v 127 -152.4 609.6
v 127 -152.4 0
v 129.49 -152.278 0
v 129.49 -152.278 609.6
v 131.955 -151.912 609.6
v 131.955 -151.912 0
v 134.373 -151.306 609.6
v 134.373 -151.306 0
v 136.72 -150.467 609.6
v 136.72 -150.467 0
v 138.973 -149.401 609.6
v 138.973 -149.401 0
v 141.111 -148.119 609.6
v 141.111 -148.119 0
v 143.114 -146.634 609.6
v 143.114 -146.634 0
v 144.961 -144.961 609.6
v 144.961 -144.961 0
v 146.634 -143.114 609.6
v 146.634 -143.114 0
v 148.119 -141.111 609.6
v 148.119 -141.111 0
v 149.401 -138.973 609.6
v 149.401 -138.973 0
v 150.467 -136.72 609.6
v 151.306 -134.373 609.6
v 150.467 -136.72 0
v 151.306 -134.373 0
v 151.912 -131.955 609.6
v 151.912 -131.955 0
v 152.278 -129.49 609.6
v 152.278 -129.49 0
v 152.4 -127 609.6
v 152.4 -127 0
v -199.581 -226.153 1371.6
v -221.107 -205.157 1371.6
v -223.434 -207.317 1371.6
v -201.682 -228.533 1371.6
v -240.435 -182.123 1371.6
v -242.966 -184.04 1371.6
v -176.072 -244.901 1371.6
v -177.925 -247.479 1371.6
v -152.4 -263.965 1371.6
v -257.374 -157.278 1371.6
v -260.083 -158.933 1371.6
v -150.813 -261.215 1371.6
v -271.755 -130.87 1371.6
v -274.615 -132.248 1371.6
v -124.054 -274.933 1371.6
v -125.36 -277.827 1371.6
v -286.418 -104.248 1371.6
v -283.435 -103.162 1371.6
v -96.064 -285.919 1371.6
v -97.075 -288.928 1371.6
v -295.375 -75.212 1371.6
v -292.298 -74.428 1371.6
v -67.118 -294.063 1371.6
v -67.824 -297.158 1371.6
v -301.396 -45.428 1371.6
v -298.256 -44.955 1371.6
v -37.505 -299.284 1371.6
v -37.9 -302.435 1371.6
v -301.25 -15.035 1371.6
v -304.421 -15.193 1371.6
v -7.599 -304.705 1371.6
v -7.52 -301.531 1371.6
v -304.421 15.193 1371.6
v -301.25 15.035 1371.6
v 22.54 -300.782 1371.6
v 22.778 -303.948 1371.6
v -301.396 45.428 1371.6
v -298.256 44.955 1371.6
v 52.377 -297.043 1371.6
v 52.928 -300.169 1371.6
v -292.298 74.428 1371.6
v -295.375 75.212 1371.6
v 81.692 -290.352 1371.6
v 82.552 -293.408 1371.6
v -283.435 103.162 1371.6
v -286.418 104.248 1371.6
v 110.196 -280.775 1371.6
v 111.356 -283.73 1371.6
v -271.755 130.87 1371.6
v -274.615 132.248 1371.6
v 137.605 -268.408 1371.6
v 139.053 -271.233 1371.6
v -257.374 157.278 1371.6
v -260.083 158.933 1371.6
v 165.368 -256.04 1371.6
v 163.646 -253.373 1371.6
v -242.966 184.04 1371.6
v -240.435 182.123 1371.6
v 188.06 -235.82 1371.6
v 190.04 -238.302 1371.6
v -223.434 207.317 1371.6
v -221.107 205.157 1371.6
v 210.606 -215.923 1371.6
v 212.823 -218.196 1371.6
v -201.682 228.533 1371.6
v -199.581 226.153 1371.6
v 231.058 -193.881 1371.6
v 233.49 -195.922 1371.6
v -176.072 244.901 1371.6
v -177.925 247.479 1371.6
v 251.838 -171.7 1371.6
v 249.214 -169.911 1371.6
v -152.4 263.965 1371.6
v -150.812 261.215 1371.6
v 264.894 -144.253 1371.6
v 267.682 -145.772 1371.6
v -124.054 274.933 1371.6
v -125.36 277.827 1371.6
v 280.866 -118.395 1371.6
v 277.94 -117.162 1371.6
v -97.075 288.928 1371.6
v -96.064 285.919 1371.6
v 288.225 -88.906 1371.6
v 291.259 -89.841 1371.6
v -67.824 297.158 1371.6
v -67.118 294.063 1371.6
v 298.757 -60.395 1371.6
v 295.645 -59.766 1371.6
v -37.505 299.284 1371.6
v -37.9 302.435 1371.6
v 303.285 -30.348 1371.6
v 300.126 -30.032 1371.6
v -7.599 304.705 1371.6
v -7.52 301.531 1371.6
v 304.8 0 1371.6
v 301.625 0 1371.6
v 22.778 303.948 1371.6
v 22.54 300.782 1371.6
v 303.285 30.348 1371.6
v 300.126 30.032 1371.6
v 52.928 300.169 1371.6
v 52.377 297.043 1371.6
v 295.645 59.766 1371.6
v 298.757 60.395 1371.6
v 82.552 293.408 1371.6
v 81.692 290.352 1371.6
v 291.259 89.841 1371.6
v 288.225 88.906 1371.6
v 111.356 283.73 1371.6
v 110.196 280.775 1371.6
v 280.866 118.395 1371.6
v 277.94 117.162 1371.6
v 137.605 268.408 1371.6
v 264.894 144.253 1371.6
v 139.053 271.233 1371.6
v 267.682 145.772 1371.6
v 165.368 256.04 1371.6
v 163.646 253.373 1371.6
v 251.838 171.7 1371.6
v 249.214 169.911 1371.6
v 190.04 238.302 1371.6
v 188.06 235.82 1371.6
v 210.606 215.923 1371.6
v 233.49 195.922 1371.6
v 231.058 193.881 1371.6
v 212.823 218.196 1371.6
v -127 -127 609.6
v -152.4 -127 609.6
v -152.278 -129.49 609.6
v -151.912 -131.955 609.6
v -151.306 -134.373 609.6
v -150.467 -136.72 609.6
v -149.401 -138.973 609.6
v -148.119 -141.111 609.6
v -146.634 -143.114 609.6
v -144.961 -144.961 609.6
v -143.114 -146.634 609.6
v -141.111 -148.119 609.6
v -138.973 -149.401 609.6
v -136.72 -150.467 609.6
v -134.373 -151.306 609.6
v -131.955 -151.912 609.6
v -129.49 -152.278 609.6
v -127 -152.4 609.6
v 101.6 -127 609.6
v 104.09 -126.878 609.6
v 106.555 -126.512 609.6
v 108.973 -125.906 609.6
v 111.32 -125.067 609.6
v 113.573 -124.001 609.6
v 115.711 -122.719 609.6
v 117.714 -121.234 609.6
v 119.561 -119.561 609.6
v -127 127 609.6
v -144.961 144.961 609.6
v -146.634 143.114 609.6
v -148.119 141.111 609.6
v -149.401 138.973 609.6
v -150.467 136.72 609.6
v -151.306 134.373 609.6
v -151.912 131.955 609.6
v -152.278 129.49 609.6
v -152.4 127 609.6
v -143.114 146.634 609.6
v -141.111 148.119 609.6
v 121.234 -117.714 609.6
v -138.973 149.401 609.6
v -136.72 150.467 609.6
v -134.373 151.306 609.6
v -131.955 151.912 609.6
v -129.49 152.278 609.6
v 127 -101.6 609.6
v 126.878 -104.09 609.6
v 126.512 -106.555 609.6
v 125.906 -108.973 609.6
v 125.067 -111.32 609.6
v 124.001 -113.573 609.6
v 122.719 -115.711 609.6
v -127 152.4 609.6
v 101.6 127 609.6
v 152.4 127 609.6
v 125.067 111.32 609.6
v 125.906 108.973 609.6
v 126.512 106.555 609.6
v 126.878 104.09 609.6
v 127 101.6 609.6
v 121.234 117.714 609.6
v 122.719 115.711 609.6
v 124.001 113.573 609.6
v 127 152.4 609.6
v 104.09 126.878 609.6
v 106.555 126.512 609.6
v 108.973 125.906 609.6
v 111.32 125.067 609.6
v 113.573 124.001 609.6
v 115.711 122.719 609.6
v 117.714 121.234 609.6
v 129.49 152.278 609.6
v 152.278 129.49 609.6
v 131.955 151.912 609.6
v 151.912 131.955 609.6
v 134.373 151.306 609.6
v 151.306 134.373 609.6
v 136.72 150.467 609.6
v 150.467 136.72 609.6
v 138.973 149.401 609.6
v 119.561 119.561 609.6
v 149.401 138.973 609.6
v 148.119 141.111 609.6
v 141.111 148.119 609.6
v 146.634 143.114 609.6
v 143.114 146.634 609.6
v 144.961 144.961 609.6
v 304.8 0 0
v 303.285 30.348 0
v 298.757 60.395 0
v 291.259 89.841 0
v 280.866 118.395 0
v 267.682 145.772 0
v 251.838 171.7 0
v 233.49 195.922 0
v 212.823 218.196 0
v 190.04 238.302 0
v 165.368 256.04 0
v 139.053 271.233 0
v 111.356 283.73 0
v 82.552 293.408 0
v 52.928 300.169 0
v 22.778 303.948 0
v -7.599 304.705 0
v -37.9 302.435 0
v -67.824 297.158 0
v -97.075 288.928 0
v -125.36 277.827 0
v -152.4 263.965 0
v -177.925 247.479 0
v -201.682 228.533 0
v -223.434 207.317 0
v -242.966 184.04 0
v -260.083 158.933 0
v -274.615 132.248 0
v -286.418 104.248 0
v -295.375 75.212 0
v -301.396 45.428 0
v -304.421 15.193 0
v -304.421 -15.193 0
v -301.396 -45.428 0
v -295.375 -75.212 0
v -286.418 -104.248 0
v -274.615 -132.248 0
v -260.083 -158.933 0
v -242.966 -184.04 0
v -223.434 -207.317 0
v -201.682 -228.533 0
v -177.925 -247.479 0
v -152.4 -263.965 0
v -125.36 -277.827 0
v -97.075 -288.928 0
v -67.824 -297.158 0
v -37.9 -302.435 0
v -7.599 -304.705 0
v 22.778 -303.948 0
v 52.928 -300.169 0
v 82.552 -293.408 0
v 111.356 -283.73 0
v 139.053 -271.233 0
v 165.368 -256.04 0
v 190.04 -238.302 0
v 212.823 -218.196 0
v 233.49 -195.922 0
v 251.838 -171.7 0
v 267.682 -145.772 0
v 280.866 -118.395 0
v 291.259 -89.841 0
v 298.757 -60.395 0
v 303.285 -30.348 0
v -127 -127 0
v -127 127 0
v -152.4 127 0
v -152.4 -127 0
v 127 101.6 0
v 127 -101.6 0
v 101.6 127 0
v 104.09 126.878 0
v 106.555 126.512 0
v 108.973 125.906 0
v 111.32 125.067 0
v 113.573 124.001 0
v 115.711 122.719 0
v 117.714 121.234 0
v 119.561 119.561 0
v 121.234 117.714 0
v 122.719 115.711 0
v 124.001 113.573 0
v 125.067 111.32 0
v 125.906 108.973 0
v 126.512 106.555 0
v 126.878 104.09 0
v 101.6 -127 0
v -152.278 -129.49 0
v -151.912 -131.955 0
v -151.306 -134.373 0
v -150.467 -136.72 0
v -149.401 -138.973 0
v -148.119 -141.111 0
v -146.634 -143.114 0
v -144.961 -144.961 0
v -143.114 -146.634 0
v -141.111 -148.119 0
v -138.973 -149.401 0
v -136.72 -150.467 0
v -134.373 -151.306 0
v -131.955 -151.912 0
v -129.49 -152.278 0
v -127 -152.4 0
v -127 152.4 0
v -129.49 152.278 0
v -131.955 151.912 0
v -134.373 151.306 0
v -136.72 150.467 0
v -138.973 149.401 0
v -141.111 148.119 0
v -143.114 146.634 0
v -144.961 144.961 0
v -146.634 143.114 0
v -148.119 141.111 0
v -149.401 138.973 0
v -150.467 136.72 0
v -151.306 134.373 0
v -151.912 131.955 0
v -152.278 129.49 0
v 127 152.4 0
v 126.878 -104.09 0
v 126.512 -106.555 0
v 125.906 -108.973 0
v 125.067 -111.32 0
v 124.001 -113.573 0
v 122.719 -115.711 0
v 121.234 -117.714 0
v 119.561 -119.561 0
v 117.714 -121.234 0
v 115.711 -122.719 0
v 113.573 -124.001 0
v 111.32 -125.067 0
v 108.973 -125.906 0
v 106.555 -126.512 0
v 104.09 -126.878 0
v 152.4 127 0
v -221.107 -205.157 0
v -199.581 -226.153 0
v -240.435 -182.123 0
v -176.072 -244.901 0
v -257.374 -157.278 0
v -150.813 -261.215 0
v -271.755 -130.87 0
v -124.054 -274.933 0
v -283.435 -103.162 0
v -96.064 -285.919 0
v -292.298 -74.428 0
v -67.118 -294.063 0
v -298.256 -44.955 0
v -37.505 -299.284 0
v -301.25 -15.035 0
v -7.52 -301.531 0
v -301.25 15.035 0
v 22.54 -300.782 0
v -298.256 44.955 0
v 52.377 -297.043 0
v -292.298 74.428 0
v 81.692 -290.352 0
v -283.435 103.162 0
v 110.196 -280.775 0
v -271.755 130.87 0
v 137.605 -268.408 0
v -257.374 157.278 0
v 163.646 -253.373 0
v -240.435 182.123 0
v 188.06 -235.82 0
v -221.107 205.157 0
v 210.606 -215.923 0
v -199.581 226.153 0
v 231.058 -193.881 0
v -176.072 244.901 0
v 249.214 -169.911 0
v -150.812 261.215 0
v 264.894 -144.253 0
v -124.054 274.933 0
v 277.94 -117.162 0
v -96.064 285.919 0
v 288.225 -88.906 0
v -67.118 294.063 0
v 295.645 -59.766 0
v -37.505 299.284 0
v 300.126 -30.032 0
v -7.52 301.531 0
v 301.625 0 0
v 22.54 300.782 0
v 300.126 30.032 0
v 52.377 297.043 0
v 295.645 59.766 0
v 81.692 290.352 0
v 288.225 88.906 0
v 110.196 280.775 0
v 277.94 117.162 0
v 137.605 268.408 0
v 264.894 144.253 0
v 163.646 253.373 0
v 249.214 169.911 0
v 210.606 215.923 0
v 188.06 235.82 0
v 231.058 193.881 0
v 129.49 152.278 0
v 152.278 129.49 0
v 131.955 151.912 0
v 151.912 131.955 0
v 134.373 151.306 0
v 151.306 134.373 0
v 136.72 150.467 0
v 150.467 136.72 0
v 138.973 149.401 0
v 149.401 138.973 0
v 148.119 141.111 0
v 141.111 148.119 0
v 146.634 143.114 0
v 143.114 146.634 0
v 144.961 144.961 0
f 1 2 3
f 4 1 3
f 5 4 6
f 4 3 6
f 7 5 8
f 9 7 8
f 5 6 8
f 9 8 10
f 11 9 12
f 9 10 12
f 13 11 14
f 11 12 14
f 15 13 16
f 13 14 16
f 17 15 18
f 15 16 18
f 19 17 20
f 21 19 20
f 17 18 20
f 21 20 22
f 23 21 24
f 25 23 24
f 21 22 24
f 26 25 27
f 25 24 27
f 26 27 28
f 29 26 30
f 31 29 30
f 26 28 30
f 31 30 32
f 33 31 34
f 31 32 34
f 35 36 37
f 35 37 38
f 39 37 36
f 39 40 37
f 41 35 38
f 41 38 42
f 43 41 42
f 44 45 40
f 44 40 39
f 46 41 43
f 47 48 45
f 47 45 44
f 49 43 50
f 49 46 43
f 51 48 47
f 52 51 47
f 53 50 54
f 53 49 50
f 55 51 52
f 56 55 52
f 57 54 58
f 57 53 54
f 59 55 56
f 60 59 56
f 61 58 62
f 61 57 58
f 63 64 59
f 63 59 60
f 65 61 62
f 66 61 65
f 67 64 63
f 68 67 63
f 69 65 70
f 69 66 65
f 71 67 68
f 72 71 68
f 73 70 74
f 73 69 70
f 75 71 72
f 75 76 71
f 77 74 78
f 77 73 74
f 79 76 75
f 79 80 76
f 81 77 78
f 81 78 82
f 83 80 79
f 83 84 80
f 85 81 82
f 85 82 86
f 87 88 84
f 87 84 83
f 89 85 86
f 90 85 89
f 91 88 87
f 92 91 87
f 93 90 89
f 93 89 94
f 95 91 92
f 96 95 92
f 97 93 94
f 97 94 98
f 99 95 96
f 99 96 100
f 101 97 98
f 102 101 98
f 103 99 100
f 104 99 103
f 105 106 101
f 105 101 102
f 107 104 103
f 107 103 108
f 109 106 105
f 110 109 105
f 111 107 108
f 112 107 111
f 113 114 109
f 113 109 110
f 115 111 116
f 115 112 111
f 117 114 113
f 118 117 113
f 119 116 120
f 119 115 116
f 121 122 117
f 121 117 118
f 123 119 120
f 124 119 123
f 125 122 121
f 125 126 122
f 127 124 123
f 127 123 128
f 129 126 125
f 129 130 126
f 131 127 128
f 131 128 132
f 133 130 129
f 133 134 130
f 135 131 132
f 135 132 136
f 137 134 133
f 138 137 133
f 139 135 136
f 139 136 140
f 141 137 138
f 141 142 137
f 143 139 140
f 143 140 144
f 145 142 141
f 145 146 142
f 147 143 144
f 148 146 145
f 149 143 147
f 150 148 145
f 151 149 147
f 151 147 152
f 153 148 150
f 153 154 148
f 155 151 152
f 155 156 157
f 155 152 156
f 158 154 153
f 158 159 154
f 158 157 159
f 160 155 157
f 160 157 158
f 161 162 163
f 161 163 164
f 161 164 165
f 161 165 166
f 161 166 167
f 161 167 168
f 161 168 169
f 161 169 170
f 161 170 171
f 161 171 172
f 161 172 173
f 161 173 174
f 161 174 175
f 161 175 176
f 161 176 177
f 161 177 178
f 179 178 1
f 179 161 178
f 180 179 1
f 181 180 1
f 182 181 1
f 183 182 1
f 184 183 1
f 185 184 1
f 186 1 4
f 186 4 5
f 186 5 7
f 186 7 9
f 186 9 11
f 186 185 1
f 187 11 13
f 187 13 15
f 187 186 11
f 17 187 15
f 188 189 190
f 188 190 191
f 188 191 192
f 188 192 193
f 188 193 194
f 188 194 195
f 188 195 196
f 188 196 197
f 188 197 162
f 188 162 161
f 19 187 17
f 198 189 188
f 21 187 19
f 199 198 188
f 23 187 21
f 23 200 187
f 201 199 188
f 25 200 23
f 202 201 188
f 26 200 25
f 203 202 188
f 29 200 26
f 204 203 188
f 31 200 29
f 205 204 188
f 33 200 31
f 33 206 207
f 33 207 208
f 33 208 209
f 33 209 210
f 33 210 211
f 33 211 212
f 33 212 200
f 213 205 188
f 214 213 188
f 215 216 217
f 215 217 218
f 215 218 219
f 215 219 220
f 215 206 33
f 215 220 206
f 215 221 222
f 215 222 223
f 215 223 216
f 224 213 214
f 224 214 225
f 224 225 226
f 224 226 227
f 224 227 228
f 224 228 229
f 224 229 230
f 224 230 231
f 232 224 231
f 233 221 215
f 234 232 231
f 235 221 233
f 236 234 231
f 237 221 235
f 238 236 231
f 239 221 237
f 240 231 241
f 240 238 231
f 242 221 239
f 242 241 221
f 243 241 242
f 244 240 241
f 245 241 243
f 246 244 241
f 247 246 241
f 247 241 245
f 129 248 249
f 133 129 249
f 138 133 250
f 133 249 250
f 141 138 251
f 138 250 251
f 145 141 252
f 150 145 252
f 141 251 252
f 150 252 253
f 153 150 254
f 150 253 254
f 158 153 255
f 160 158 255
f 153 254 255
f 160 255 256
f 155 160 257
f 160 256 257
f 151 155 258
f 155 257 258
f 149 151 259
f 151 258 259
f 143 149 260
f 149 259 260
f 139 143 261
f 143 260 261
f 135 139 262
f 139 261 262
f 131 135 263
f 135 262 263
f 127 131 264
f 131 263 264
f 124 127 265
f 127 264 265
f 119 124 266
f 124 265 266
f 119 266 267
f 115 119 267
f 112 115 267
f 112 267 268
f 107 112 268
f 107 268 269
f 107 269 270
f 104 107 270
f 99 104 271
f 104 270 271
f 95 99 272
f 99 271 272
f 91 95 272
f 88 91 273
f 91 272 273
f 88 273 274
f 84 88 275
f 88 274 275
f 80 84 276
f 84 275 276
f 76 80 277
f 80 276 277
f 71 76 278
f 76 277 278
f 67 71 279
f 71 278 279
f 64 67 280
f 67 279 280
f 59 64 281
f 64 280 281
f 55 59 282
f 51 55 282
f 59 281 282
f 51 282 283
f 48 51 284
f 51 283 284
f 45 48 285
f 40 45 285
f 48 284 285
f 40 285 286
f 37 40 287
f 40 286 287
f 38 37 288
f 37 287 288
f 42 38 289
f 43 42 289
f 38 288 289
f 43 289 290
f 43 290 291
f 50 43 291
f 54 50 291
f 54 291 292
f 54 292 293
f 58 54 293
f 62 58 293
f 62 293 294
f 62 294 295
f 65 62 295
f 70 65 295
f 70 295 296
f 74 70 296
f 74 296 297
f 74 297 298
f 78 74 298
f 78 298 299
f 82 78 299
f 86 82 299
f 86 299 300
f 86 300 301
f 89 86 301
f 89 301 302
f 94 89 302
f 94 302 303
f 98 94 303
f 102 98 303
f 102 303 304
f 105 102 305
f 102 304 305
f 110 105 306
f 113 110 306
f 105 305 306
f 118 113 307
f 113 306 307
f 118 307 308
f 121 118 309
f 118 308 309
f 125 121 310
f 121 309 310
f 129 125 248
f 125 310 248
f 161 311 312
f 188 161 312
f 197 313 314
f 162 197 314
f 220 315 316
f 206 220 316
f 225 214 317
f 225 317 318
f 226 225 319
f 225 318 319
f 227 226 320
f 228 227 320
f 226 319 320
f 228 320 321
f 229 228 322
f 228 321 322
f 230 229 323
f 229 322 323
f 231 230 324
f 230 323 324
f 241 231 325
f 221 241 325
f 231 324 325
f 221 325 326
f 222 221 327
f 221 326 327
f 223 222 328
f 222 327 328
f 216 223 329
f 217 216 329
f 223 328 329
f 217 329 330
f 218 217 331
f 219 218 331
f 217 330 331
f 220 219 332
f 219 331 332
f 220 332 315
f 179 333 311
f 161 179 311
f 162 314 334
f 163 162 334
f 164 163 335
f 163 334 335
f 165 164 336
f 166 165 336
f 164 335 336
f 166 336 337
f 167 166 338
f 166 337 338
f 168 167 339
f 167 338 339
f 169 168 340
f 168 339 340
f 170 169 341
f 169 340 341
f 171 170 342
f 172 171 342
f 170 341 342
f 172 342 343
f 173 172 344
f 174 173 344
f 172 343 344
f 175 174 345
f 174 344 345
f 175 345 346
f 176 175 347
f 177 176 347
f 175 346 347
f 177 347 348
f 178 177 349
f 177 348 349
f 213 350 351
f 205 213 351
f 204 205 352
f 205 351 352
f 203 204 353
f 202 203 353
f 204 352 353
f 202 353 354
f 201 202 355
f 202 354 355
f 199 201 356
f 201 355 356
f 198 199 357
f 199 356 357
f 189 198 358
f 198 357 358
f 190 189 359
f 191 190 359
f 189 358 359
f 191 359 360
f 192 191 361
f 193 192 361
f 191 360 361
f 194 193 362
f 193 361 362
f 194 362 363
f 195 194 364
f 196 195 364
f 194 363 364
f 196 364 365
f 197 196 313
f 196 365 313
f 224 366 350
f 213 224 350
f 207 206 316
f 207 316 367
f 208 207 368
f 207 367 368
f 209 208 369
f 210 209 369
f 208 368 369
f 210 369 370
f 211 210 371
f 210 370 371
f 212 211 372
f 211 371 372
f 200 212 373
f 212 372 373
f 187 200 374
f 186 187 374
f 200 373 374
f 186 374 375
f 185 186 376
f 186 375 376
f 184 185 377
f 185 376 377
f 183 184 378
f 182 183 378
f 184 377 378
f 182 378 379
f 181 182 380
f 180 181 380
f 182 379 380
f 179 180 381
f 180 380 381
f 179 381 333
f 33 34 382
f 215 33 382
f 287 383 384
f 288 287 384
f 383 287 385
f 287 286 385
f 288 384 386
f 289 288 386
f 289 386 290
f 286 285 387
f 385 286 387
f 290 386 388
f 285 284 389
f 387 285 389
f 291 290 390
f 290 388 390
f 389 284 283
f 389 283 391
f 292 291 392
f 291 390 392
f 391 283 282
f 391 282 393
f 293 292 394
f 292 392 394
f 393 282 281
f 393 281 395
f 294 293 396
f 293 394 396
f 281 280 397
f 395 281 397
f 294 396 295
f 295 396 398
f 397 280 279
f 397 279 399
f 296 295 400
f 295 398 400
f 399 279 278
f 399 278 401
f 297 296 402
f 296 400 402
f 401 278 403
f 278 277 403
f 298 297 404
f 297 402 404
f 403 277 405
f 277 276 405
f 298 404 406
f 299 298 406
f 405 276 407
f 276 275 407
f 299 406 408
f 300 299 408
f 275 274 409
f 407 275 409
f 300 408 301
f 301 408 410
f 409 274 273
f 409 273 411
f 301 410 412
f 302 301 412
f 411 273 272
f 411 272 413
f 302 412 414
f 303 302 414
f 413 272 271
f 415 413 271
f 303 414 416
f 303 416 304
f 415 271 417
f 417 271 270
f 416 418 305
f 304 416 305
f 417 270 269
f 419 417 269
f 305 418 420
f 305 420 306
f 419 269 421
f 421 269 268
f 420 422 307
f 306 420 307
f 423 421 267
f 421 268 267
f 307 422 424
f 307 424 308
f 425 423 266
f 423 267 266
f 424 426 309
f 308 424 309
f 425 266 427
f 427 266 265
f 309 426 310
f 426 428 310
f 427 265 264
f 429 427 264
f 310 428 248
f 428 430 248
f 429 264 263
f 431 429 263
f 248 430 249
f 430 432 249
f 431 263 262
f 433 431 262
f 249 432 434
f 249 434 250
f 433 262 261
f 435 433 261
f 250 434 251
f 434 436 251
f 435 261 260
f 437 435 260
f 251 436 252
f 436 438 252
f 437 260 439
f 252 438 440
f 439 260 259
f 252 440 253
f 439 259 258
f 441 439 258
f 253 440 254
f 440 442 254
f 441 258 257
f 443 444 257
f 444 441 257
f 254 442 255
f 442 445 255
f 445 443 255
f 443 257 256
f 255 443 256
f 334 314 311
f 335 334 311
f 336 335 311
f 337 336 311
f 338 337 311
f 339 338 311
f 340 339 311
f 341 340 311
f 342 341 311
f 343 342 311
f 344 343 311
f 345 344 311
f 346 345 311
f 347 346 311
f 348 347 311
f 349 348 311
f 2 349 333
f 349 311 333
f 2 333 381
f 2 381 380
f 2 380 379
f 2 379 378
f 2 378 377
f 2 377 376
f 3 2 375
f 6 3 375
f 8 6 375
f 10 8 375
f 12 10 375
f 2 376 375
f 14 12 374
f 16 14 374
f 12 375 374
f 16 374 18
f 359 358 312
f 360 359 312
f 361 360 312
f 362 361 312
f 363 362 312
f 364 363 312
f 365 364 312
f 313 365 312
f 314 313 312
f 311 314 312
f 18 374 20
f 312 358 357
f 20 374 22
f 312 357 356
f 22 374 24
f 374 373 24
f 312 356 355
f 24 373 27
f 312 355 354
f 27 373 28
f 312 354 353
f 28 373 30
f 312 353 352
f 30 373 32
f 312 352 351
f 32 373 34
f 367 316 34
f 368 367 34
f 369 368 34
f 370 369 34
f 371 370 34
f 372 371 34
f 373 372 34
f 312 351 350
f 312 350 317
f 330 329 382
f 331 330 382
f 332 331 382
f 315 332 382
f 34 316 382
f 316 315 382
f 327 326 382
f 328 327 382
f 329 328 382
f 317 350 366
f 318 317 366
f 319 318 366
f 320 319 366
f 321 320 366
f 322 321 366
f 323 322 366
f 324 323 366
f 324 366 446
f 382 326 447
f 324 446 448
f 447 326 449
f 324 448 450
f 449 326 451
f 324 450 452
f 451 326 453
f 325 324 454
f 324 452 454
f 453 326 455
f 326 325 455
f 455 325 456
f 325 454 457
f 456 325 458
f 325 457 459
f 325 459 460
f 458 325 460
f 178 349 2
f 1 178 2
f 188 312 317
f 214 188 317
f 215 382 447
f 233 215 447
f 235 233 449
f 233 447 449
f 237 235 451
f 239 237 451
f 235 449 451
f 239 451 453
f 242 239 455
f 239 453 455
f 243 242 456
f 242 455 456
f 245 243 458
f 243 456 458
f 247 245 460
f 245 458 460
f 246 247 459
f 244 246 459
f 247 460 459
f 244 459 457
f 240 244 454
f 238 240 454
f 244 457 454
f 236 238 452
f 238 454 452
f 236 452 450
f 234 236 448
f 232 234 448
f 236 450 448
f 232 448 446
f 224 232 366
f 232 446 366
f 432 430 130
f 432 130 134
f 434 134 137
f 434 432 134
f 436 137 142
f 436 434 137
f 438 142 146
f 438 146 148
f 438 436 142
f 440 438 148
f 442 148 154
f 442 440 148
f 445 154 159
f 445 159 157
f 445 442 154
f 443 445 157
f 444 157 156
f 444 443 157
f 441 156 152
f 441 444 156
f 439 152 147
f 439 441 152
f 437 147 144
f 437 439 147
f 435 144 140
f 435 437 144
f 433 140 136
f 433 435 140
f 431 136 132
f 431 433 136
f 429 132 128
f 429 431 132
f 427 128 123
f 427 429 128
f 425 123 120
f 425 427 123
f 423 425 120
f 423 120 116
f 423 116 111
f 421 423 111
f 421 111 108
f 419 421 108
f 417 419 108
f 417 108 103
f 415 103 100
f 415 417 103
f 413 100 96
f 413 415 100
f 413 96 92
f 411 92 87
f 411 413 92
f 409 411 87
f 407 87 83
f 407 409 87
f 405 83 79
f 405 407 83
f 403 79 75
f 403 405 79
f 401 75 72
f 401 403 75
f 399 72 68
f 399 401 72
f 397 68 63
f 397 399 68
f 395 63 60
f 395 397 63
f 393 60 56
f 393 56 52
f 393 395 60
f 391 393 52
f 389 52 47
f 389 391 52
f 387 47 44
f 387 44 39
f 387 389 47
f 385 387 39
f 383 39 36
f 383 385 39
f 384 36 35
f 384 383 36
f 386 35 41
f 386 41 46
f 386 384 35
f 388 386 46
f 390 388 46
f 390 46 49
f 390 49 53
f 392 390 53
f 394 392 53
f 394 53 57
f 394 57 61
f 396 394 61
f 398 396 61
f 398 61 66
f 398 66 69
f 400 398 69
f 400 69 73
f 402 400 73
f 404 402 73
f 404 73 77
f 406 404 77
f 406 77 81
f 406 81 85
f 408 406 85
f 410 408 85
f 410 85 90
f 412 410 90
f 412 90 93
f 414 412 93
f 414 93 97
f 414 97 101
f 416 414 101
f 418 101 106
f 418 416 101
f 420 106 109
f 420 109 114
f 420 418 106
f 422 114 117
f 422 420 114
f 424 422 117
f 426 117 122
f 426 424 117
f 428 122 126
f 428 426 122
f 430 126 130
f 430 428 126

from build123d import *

# Parameters (mm, degrees)
F1_DEPTH = 609.6
F0_R     = 304.8
F0_R_2   = 301.625
F2_DEPTH = 1371.6


with BuildPart() as f1:
    # F0 (on Top) → F1 (new body)
    with BuildSketch(Plane.XY):
        with BuildLine():
            Line((127, 152.4), (-127, 152.4))
            ThreePointArc((-127, 152.4), (-144.960512, 144.960512), (-152.4, 127))
            Line((-152.4, 127), (-152.4, -127))
            ThreePointArc((-152.4, -127), (-144.960512, -144.960512), (-127, -152.4))
            Line((-127, -152.4), (127, -152.4))
            ThreePointArc((127, -152.4), (144.960512, -144.960512), (152.4, -127))
            Line((152.4, -127), (152.4, 127))
            ThreePointArc((152.4, 127), (144.960512, 144.960512), (127, 152.4))
        make_face()
        with BuildLine():
            ThreePointArc((127, -101.6), (119.560512, -119.560512), (101.6, -127))
            Line((101.6, -127), (-127, -127))
            Line((-127, -127), (-127, 127))
            Line((-127, 127), (101.6, 127))
            ThreePointArc((101.6, 127), (119.560512, 119.560512), (127, 101.6))
            Line((127, 101.6), (127, -101.6))
        make_face(mode=Mode.SUBTRACT)
    extrude(amount=F1_DEPTH)


with BuildPart() as f2:
    # F0 (on Top) → F2 (new body)
    with BuildSketch(Plane.XY):
        Circle(F0_R)
        Circle(F0_R_2, mode=Mode.SUBTRACT)
    extrude(amount=F2_DEPTH)


solid = Compound([f1.part, f2.part])
